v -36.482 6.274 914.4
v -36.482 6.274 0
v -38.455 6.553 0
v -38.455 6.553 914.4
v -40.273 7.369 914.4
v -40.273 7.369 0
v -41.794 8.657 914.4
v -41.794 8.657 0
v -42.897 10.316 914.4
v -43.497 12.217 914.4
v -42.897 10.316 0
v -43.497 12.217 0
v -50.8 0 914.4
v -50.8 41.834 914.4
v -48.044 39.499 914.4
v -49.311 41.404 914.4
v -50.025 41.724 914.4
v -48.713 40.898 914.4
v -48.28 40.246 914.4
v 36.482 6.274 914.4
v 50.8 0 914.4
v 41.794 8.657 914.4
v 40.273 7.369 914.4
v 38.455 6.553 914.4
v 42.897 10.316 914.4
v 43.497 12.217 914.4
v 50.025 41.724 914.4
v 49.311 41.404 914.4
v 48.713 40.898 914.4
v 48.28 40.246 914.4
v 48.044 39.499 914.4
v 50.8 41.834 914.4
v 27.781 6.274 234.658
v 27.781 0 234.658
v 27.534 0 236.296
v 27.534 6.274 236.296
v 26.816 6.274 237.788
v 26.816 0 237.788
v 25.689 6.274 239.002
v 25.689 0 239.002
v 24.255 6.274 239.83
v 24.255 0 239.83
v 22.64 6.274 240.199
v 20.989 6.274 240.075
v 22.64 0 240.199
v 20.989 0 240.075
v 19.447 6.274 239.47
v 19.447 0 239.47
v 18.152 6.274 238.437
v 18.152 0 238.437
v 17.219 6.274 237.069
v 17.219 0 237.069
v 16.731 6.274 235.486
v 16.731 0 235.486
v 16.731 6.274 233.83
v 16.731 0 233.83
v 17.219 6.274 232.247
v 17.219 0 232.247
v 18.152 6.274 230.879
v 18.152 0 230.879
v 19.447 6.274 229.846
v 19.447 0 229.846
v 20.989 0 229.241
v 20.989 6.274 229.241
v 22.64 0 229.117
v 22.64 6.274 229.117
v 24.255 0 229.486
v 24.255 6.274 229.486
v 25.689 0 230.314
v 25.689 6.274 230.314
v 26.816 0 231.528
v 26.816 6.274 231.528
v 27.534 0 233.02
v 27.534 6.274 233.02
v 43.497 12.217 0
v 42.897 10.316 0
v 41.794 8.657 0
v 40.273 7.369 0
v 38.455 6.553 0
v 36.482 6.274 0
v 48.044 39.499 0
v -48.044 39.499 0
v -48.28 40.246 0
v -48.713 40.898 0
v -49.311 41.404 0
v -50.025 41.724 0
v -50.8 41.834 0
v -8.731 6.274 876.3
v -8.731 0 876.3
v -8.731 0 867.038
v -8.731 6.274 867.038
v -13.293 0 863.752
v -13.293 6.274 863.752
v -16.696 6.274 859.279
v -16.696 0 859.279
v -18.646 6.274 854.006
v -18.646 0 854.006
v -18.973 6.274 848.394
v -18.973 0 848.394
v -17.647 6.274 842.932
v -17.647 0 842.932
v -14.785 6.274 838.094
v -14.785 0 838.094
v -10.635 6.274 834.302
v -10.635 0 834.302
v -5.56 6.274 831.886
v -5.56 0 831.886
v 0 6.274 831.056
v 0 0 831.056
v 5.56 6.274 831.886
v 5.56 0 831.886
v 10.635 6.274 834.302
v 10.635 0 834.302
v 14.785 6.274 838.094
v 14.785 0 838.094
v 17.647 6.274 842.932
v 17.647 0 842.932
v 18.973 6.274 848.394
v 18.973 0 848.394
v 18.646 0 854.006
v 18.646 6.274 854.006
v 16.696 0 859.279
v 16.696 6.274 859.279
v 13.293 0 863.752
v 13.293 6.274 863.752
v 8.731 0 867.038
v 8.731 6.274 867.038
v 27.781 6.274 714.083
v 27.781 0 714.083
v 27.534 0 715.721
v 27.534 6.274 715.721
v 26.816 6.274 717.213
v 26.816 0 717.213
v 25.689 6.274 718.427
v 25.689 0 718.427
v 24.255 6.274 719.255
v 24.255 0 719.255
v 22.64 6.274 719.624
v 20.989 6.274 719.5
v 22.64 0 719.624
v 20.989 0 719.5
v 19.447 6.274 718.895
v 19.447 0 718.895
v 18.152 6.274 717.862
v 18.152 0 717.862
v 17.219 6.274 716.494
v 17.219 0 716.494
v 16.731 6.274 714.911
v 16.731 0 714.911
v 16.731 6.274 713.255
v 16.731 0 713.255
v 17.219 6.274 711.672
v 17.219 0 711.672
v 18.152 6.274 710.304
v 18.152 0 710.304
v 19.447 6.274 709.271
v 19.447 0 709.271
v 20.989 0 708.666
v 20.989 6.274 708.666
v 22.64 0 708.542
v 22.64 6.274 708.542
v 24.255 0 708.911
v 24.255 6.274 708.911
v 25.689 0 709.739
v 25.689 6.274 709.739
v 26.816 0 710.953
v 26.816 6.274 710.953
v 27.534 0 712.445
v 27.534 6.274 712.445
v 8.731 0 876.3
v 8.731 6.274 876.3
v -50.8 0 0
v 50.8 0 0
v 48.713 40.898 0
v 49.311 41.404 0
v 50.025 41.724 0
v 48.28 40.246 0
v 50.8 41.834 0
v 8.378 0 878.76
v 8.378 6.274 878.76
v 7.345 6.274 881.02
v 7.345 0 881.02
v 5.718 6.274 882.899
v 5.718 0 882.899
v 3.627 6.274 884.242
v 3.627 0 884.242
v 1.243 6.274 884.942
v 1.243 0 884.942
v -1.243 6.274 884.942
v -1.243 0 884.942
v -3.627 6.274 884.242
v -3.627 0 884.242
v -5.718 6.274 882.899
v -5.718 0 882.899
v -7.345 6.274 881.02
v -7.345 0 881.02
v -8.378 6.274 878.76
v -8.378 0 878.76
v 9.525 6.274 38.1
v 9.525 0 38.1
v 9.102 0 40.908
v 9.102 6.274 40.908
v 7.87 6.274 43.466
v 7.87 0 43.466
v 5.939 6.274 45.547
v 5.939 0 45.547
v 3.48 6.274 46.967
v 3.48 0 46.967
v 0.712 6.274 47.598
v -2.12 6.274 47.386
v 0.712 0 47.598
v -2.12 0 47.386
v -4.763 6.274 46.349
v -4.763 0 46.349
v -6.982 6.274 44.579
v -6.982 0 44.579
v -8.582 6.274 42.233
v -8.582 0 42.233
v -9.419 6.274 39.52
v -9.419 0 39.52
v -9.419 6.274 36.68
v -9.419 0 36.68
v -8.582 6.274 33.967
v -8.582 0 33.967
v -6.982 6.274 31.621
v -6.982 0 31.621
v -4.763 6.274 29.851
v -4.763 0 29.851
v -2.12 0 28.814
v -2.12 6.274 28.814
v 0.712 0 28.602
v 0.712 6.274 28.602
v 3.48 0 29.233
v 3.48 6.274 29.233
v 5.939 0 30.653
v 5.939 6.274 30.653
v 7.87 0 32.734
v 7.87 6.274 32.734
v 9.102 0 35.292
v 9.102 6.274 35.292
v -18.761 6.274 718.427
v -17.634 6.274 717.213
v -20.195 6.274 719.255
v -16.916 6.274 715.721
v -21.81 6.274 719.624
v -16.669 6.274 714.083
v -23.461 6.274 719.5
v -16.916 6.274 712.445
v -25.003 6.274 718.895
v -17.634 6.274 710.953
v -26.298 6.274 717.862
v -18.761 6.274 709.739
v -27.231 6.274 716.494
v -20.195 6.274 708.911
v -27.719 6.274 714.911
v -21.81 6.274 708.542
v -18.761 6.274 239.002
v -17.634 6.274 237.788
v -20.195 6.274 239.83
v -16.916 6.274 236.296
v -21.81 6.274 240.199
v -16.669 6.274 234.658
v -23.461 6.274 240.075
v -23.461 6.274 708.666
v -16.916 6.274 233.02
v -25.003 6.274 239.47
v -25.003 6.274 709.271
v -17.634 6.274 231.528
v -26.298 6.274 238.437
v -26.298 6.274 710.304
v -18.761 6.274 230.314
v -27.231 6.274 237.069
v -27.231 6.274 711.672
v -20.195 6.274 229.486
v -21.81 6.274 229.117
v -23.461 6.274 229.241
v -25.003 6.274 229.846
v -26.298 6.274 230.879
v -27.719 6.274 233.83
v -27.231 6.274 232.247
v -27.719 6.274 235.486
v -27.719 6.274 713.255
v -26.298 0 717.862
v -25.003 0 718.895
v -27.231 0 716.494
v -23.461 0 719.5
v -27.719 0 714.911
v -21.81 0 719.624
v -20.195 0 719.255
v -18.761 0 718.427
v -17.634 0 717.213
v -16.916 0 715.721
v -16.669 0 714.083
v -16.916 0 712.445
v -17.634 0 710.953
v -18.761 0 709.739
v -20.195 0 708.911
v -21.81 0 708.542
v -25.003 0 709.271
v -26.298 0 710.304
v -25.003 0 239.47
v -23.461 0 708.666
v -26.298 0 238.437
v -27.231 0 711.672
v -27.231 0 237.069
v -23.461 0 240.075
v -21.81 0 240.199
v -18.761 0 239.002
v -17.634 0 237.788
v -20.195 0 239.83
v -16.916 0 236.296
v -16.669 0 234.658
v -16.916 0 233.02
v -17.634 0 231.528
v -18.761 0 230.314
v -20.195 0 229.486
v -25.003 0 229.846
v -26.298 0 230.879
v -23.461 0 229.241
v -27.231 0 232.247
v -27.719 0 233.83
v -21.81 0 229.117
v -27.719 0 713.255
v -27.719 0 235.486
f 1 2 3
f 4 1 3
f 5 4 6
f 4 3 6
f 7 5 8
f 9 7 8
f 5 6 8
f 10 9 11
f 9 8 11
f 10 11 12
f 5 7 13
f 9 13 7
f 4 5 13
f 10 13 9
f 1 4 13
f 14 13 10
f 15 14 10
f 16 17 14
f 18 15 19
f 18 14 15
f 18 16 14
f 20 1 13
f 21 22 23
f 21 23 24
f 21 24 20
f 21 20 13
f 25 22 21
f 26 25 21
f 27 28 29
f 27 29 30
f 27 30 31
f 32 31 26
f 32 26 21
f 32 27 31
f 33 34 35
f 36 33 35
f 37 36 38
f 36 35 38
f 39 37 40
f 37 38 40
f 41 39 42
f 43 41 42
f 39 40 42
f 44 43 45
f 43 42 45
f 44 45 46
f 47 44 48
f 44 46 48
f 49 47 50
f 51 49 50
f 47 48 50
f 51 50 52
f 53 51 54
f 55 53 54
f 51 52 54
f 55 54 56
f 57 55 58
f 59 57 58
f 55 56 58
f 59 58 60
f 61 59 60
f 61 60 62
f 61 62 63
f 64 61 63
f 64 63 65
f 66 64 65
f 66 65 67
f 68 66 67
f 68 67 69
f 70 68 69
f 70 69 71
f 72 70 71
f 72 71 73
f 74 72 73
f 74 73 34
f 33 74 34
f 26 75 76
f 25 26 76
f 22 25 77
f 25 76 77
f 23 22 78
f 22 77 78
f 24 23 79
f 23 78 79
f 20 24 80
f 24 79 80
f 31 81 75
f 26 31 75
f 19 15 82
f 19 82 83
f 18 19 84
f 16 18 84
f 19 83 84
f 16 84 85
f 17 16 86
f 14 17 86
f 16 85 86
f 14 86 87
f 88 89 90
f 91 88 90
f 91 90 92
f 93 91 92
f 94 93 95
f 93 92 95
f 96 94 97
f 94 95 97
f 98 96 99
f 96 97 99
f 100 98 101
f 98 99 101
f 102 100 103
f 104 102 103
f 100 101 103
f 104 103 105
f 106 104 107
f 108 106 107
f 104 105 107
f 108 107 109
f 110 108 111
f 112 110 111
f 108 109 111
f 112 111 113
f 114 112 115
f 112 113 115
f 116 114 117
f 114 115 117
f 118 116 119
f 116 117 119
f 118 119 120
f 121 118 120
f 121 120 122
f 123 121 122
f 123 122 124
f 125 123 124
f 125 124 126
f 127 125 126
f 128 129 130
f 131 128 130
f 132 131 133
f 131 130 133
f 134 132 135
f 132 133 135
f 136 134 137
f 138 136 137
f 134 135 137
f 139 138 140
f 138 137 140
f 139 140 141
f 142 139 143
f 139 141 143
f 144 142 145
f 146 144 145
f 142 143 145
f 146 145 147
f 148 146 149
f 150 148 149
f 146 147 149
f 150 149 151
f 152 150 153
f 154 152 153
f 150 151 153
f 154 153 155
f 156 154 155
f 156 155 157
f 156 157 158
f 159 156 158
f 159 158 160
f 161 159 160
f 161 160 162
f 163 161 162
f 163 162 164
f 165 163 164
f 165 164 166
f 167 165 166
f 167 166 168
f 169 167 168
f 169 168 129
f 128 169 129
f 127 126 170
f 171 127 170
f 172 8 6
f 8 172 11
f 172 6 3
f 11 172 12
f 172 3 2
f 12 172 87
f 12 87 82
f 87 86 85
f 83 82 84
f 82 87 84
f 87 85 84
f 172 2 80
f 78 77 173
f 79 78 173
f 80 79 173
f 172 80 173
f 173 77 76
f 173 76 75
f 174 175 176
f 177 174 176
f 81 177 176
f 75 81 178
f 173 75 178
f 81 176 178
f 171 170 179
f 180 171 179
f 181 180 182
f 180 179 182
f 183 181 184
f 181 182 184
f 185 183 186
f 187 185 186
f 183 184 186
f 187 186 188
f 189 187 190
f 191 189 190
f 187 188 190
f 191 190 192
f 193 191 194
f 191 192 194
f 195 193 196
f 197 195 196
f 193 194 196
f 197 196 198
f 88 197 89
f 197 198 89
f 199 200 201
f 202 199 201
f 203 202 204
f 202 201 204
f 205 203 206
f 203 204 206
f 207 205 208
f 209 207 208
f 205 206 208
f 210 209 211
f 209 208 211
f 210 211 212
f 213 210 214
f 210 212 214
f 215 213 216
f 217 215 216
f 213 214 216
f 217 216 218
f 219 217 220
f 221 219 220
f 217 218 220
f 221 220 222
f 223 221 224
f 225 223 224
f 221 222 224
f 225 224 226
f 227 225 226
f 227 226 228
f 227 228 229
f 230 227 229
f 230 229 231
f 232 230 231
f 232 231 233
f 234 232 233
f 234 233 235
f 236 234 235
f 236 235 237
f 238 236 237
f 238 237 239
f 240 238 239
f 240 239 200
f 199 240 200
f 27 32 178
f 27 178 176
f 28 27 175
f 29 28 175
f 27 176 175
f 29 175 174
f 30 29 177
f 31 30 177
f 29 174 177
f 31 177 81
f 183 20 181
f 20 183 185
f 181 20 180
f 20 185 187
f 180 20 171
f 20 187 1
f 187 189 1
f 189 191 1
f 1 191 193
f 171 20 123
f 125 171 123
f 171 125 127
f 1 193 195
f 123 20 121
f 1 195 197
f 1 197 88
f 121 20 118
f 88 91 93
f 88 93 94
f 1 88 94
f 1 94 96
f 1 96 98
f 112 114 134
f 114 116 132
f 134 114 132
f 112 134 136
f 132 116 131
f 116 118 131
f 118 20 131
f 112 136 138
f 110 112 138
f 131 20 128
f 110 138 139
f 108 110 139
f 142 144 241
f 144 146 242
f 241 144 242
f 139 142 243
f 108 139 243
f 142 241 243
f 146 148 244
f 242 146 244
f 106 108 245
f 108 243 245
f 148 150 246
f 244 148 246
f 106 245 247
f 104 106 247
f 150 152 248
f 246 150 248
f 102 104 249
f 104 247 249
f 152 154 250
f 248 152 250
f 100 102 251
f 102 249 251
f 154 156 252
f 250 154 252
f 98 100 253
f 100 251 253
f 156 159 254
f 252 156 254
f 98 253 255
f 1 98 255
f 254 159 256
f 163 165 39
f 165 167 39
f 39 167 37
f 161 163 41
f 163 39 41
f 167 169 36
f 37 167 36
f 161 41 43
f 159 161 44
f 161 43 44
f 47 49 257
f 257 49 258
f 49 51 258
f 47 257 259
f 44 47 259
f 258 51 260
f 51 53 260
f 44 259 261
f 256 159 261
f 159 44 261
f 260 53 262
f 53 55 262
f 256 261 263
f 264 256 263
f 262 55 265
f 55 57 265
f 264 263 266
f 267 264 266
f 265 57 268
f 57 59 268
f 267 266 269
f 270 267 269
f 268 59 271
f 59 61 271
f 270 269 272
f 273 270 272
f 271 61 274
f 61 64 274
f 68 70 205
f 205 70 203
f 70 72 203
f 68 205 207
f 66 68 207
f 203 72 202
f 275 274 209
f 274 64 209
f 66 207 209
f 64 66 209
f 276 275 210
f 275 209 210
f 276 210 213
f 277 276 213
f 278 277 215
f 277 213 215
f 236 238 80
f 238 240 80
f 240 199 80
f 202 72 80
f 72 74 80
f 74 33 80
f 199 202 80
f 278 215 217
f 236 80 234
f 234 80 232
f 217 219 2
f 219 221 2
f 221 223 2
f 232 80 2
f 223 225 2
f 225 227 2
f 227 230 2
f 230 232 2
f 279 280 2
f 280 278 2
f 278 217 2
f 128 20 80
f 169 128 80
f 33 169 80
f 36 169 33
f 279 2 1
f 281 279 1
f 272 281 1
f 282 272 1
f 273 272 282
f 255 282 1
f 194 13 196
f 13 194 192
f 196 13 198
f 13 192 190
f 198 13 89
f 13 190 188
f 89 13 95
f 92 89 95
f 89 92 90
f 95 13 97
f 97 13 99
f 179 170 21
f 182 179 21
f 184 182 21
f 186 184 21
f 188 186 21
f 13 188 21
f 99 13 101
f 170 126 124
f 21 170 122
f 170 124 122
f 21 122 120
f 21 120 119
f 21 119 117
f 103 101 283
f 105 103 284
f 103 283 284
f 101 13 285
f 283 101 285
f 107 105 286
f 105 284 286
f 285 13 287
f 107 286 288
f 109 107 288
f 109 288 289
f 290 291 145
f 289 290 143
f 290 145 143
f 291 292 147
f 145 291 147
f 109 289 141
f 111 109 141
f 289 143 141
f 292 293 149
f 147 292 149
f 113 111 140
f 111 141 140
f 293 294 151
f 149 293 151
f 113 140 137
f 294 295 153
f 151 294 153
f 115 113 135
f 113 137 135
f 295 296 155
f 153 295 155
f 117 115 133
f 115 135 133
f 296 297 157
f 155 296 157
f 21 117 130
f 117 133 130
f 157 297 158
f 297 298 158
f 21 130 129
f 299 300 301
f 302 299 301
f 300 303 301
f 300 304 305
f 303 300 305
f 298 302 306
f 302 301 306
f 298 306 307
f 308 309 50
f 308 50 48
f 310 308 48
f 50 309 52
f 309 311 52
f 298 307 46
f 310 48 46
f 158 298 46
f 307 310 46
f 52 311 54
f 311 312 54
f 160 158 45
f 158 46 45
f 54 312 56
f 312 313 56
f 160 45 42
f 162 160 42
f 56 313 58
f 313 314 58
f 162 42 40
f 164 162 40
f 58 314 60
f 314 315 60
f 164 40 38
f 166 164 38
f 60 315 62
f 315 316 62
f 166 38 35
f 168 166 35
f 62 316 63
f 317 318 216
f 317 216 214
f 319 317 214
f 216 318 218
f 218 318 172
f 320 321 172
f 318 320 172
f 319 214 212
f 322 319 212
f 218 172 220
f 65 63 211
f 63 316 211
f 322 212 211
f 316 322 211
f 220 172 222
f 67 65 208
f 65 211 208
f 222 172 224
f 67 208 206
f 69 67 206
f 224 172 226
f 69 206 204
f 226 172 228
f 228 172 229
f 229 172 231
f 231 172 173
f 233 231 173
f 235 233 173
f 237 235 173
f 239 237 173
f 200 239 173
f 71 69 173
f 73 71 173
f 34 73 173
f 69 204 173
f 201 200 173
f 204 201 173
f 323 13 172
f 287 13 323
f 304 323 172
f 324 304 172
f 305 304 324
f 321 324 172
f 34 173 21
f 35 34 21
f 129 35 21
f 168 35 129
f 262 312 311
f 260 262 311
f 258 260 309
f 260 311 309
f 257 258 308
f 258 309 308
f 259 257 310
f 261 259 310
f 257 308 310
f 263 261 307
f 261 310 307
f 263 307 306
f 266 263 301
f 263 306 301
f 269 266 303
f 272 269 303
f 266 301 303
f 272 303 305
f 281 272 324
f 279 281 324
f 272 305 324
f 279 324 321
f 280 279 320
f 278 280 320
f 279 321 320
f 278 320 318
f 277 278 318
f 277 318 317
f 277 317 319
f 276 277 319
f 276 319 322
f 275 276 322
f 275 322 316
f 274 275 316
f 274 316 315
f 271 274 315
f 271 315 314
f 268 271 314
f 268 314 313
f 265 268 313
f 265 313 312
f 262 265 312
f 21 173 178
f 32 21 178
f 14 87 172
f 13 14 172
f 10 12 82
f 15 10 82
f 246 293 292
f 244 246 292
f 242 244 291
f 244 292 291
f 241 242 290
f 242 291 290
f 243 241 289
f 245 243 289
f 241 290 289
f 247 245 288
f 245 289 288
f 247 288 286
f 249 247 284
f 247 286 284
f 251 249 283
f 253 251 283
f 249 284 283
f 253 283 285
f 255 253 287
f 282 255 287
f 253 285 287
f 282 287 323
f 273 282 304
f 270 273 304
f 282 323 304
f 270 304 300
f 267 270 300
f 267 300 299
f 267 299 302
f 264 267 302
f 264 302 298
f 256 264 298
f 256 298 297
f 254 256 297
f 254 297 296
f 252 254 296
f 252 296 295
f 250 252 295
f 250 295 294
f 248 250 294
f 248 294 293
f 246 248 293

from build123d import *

# Parameters (mm, degrees)
F1_DEPTH = 914.4
F2_R     = 9.525
F3_DEPTH = 41.8348
F5_DEPTH = 41.8348
F6_R     = 5.55625
F7_DEPTH = 41.8348


with BuildPart() as f1:
    # F0 (on Top) → F1 (new body)
    with BuildSketch(Plane.XY):
        with BuildLine():
            Line((-50.8, 41.8338), (-50.8, 0))
            Line((-50.8, 0), (50.8, 0))
            Line((50.8, 0), (50.8, 41.8338))
            ThreePointArc((50.8, 41.8338), (48.9940285402, 41.1716778311), (48.0440153768, 39.4991307706))
            Line((48.0440153768, 39.4991307706), (43.4969259811, 12.216594402))
            ThreePointArc((43.4969259811, 12.216594402), (41.078710656, 7.9592018846), (36.4816923948, 6.2738))
            Line((36.4816923948, 6.2738), (-36.4816923948, 6.2738))
            ThreePointArc((-36.4816923948, 6.2738), (-41.078710656, 7.9592018846), (-43.4969259811, 12.216594402))
            Line((-43.4969259811, 12.216594402), (-48.0440153768, 39.4991307706))
            ThreePointArc((-48.0440153768, 39.4991307706), (-48.9940285402, 41.1716778311), (-50.8, 41.8338))
        make_face()
    extrude(amount=F1_DEPTH)

    # F2 (on face) → F3 (cut, through all)
    with BuildSketch(Plane.XZ):
        with Locations((0, 38.1)):
            Circle(F2_R)
    extrude(amount=-F3_DEPTH, mode=Mode.SUBTRACT)

    # F4 (on face) → F5 (cut, through all)
    with BuildSketch(Plane.XZ):
        with BuildLine():
            Line((8.73125, 867.0375161499), (8.73125, 876.3))
            ThreePointArc((8.73125, 876.3), (0, 885.03125), (-8.73125, 876.3))
            Line((-8.73125, 876.3), (-8.73125, 867.0375161499))
            ThreePointArc((-8.73125, 867.0375161499), (0, 831.05625), (8.73125, 867.0375161499))
        make_face()
    extrude(amount=-F5_DEPTH, mode=Mode.SUBTRACT)

    # F6 (on face) → F7 (cut, through all)
    with BuildSketch(Plane.XZ):
        with Locations((-22.225, 714.0829)):
            Circle(F6_R)
        with Locations((22.225, 714.0829)):
            Circle(F6_R)
        with Locations((-22.225, 234.6579)):
            Circle(F6_R)
        with Locations((22.225, 234.6579)):
            Circle(F6_R)
    extrude(amount=-F7_DEPTH, mode=Mode.SUBTRACT)


solid = f1.part
